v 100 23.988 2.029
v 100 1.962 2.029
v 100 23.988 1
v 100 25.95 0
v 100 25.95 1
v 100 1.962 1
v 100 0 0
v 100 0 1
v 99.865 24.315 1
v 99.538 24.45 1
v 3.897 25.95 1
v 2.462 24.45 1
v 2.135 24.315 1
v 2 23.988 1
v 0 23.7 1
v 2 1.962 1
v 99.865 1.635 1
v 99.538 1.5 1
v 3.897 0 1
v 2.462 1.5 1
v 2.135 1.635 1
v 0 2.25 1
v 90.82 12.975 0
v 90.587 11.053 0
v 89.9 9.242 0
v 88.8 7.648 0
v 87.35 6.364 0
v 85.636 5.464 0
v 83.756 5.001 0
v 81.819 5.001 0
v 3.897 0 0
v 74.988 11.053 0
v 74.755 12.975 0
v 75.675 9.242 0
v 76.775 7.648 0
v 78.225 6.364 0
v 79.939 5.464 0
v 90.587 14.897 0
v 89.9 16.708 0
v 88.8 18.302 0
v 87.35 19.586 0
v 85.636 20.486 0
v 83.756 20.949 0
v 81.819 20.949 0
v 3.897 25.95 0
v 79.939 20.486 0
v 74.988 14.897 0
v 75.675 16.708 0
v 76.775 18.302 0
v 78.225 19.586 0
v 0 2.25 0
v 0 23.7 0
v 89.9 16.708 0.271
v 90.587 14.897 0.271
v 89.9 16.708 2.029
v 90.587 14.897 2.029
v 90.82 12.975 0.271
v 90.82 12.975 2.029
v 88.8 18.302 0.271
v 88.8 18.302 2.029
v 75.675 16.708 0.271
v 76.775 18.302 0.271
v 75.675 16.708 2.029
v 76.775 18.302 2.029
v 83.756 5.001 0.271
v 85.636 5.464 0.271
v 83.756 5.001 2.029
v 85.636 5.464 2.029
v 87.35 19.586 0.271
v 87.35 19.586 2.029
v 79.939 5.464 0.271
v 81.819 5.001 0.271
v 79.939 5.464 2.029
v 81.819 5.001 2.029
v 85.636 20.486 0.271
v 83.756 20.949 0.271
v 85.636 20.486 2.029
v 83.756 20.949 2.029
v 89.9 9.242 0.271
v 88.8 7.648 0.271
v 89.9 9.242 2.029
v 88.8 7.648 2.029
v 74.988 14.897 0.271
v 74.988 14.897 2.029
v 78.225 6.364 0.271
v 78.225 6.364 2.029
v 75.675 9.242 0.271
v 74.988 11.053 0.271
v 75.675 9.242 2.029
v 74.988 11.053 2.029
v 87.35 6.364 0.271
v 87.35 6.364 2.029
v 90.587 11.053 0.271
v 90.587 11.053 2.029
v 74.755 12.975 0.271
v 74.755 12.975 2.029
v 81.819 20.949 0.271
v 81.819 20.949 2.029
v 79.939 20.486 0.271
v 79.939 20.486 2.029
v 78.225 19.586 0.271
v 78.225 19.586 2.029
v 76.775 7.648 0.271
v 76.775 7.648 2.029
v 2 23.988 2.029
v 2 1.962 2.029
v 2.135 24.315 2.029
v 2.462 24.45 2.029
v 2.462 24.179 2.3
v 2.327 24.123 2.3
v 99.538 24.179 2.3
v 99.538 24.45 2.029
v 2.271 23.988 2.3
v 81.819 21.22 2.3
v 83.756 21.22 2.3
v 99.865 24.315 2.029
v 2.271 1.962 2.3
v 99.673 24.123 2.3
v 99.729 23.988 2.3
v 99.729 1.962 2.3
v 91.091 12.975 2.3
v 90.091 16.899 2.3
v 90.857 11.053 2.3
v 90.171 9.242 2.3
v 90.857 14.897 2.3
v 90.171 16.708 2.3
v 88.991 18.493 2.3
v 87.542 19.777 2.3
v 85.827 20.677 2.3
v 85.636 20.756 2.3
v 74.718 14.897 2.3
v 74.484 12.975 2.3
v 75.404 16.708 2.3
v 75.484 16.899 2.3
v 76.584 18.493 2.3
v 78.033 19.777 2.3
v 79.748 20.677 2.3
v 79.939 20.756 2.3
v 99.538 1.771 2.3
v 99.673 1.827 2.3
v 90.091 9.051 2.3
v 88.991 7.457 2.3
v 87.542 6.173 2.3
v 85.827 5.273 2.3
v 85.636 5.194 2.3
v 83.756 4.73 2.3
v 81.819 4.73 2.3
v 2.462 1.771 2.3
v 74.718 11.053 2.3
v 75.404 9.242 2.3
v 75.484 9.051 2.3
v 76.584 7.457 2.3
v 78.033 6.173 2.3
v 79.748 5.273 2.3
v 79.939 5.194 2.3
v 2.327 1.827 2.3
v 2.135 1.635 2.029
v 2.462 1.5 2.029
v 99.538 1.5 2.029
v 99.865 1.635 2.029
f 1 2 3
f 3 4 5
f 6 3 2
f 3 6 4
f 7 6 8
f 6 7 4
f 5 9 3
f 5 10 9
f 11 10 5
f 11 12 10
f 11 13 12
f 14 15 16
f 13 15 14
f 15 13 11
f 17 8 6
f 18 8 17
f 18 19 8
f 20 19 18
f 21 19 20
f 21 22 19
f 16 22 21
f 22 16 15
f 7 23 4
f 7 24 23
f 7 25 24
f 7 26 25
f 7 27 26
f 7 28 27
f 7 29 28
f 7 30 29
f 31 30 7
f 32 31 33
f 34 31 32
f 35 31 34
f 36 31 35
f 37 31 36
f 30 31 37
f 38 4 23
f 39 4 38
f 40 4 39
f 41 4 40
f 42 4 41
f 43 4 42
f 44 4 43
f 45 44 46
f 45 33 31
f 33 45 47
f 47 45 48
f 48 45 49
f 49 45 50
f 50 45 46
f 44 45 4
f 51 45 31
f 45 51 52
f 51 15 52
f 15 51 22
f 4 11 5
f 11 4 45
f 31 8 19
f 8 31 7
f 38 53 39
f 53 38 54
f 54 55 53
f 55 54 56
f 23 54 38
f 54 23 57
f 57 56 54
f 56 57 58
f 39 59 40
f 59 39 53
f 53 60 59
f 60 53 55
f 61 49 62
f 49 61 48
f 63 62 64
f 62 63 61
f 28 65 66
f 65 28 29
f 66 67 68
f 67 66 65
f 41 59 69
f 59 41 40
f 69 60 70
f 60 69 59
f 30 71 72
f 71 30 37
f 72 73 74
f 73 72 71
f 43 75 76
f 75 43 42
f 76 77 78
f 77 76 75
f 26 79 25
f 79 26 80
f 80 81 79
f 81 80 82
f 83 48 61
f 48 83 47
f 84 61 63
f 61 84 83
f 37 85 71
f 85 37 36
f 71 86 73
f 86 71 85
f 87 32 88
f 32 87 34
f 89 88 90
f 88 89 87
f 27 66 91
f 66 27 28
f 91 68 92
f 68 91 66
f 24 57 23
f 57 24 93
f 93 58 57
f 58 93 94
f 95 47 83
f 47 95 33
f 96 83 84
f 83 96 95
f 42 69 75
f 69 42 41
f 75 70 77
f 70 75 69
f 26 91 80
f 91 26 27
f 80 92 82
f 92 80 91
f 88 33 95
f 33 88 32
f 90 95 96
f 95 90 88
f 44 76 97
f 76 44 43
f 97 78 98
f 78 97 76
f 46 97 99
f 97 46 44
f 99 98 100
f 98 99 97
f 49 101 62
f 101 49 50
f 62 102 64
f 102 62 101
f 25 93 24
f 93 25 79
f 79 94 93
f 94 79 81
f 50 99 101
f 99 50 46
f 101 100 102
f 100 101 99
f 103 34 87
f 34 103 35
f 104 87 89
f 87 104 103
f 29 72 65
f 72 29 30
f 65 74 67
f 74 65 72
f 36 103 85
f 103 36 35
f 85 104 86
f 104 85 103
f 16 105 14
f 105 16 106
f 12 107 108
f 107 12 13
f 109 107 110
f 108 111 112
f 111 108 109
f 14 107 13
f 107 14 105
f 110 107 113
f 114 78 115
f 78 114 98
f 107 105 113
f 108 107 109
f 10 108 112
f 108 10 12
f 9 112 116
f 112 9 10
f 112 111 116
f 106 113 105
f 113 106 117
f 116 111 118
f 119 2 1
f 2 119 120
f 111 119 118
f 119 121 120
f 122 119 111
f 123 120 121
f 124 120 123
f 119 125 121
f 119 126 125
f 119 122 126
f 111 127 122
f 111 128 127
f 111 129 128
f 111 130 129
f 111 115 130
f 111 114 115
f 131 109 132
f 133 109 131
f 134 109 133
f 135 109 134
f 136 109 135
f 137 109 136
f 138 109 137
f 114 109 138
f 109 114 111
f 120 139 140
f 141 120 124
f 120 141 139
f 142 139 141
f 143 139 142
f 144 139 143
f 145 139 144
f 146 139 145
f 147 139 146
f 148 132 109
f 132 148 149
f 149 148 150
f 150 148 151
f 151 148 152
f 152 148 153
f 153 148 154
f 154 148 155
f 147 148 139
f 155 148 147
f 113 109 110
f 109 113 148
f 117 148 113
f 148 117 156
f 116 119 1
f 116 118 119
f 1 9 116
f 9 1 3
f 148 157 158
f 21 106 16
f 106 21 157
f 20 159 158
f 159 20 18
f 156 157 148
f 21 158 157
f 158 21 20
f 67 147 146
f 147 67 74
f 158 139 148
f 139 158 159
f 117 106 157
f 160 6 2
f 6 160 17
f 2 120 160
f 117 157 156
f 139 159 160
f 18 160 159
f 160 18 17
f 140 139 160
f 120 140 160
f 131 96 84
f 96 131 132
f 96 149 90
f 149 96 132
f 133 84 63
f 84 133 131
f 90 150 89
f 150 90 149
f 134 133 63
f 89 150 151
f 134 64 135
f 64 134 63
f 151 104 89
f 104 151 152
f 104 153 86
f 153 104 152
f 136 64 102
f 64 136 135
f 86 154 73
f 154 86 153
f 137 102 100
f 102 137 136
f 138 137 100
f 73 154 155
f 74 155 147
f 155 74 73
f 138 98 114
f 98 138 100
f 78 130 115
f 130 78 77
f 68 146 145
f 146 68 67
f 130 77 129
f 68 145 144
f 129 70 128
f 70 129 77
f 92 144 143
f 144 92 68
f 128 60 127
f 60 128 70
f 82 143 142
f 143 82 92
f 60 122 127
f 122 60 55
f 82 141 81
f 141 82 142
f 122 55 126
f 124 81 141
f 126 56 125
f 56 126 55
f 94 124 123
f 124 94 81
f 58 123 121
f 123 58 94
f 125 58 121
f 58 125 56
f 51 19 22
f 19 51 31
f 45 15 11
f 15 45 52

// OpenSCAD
// file: ../chamferer.scad
INFINITY = 10000;
ATOM = .01;

module chamfer_tool(r, fn, tool,
                    ax, ay, az,
                    ax2, ay2, az2,
                    ax3, ay3, az3) {
    rotate([ax3, ay3, az3])
    rotate([ax2, ay2, az2])
    rotate([ax, ay, az]) {
        if (tool=="sphere") {
            sphere(r, $fn=fn);
        }
        else if (tool=="hemisphere-up") {
            intersection() {
                sphere(r, $fn=fn);
                cylinder(r=r*2, h=r*2);
            }
        }
        else if (tool=="hemisphere-down") {
            difference() {
                sphere(r, $fn=fn);
                cylinder(r=r*2, h=r*2);
            }
        }
        else if (tool=="cone") {
            cylinder(r, r, 0, $fn=fn);
            scale([1, 1, -1])
            cylinder(r, r, 0, $fn=fn);
        }
        else if (tool=="cone-up") {
            cylinder(r, r, 0, $fn=fn, center=true);
        }
        else if (tool=="cone-down") {
            scale([1, 1, -1])
            cylinder(r, r, 0, $fn=fn, center=true);
        }
        else if (tool=="octahedron") {
            resize([r*2, r*2, r*2]) {
                cylinder(r, r, 0, $fn=4);
                scale([1, 1, -1])
                cylinder(r, r, 0, $fn=4);
            }
        }
        else if (tool=="pyramid") {
            resize([r*2, r*2, r*2]) {
                cylinder(r, r, 0, center=true, $fn=4);
            }
        }
        else if (tool=="rpyramid") {
            resize([r*2, r*2, r*2]) {
                cylinder(r, 0, r, center=true, $fn=4);
            }
        }
        else if (tool=="cylinder-z" || tool=="cylinder") {
            cylinder(r=r, h=ATOM, $fn=fn, center=true);
        }
        else if (tool=="cylinder-x") {
            rotate([0, 90, 0])
            cylinder(r=r, h=ATOM, $fn=fn, center=true);
        }
        else if (tool=="cylinder-y") {
            rotate([90, 0, 0])
            cylinder(r=r, h=ATOM, $fn=fn, center=true);
        }
        else if (tool=="cube") {
            cube(r*2, center=true);
        }
        else if (tool=="plate-y") {
            cube([r*2, ATOM, r*2], center=true);
        }
        else {
            assert(false, str("Unknown tool: ", tool));
        }
    }
}

module shrinker(r, tool, fn,
                ax, ay, az,
                ax2, ay2, az2,
                ax3, ay3, az3) {
    if (!r) {
        children();
    }
    else {
        // re-invert+grow = fillet
        difference() {
            cube(INFINITY/2, center=true);

            // invert+grow = carve
            minkowski() {
                difference() {
                    cube(INFINITY, center=true);
                    children();
                }
                //cube(r, center=true);
                chamfer_tool(r, fn, tool,
                             ax, ay, az,
                             ax2, ay2, az2,
                             ax3, ay3, az3);
            }
        }
    }
}

module chamferer(r, tool="sphere", fn=8, shrink=true, grow=true,
                 ax=0, ay=0, az=0,
                 ax2=0, ay2=0, az2=0,
                 ax3=0, ay3=0, az3=0,
) {
    if (!r) {
        children();
    }
    else {
        minkowski() {
            if (shrink)
                shrinker(r, tool, fn,
                         ax, ay, az,
                         ax2, ay2, az2,
                         ax3, ay3, az3) children();
            else
                children();
            
            if (grow)
                chamfer_tool(r, fn, tool,
                             ax, ay, az,
                             ax2, ay2, az2,
                             ax3, ay3, az3);
        }
    }
}



cube(50);

translate([70, 0, 0])
chamferer(5, "hemisphere-up", $preview? 6*4 : 30)
//shrinker(5, "sphere", $preview? 6*4 : 30)
cube(50);

translate([70*2, 0, 0])
chamferer(5, "octahedron", grow=false)
cube(50);
// main file
use <../chamferer.scad>

W  = 22.25  +.35        *2;
TH =  2.3;
L1 = 33.5;
L  = 70.0  + 30;
MA =  1.0               +.5;


difference() {
    union() {
        difference() {
            cube([L, W+MA*2, 1]);
            translate([L-W*.75, MA+W/2, -.1])
            cylinder(d=W*.7, h=TH*2+2);
        }

        chamferer(.5) difference() {
            translate([2, MA, 0])
            cube([L-2, W, TH]);

            translate([L-W*.75, MA+W/2, -.1])
            cylinder(d=W*.7, h=TH*2+2);
        }
    }
    
    d = MA * 4;
    translate([0, MA*1.5, -.1])
    rotate([0, 0, -30])
    translate([0, -d, 0])
    cube([L, d, TH+1]);

    translate([0, W+MA/2, -.1])
    rotate([0, 0, 30])
    cube([L, d, TH+1]);
}    
